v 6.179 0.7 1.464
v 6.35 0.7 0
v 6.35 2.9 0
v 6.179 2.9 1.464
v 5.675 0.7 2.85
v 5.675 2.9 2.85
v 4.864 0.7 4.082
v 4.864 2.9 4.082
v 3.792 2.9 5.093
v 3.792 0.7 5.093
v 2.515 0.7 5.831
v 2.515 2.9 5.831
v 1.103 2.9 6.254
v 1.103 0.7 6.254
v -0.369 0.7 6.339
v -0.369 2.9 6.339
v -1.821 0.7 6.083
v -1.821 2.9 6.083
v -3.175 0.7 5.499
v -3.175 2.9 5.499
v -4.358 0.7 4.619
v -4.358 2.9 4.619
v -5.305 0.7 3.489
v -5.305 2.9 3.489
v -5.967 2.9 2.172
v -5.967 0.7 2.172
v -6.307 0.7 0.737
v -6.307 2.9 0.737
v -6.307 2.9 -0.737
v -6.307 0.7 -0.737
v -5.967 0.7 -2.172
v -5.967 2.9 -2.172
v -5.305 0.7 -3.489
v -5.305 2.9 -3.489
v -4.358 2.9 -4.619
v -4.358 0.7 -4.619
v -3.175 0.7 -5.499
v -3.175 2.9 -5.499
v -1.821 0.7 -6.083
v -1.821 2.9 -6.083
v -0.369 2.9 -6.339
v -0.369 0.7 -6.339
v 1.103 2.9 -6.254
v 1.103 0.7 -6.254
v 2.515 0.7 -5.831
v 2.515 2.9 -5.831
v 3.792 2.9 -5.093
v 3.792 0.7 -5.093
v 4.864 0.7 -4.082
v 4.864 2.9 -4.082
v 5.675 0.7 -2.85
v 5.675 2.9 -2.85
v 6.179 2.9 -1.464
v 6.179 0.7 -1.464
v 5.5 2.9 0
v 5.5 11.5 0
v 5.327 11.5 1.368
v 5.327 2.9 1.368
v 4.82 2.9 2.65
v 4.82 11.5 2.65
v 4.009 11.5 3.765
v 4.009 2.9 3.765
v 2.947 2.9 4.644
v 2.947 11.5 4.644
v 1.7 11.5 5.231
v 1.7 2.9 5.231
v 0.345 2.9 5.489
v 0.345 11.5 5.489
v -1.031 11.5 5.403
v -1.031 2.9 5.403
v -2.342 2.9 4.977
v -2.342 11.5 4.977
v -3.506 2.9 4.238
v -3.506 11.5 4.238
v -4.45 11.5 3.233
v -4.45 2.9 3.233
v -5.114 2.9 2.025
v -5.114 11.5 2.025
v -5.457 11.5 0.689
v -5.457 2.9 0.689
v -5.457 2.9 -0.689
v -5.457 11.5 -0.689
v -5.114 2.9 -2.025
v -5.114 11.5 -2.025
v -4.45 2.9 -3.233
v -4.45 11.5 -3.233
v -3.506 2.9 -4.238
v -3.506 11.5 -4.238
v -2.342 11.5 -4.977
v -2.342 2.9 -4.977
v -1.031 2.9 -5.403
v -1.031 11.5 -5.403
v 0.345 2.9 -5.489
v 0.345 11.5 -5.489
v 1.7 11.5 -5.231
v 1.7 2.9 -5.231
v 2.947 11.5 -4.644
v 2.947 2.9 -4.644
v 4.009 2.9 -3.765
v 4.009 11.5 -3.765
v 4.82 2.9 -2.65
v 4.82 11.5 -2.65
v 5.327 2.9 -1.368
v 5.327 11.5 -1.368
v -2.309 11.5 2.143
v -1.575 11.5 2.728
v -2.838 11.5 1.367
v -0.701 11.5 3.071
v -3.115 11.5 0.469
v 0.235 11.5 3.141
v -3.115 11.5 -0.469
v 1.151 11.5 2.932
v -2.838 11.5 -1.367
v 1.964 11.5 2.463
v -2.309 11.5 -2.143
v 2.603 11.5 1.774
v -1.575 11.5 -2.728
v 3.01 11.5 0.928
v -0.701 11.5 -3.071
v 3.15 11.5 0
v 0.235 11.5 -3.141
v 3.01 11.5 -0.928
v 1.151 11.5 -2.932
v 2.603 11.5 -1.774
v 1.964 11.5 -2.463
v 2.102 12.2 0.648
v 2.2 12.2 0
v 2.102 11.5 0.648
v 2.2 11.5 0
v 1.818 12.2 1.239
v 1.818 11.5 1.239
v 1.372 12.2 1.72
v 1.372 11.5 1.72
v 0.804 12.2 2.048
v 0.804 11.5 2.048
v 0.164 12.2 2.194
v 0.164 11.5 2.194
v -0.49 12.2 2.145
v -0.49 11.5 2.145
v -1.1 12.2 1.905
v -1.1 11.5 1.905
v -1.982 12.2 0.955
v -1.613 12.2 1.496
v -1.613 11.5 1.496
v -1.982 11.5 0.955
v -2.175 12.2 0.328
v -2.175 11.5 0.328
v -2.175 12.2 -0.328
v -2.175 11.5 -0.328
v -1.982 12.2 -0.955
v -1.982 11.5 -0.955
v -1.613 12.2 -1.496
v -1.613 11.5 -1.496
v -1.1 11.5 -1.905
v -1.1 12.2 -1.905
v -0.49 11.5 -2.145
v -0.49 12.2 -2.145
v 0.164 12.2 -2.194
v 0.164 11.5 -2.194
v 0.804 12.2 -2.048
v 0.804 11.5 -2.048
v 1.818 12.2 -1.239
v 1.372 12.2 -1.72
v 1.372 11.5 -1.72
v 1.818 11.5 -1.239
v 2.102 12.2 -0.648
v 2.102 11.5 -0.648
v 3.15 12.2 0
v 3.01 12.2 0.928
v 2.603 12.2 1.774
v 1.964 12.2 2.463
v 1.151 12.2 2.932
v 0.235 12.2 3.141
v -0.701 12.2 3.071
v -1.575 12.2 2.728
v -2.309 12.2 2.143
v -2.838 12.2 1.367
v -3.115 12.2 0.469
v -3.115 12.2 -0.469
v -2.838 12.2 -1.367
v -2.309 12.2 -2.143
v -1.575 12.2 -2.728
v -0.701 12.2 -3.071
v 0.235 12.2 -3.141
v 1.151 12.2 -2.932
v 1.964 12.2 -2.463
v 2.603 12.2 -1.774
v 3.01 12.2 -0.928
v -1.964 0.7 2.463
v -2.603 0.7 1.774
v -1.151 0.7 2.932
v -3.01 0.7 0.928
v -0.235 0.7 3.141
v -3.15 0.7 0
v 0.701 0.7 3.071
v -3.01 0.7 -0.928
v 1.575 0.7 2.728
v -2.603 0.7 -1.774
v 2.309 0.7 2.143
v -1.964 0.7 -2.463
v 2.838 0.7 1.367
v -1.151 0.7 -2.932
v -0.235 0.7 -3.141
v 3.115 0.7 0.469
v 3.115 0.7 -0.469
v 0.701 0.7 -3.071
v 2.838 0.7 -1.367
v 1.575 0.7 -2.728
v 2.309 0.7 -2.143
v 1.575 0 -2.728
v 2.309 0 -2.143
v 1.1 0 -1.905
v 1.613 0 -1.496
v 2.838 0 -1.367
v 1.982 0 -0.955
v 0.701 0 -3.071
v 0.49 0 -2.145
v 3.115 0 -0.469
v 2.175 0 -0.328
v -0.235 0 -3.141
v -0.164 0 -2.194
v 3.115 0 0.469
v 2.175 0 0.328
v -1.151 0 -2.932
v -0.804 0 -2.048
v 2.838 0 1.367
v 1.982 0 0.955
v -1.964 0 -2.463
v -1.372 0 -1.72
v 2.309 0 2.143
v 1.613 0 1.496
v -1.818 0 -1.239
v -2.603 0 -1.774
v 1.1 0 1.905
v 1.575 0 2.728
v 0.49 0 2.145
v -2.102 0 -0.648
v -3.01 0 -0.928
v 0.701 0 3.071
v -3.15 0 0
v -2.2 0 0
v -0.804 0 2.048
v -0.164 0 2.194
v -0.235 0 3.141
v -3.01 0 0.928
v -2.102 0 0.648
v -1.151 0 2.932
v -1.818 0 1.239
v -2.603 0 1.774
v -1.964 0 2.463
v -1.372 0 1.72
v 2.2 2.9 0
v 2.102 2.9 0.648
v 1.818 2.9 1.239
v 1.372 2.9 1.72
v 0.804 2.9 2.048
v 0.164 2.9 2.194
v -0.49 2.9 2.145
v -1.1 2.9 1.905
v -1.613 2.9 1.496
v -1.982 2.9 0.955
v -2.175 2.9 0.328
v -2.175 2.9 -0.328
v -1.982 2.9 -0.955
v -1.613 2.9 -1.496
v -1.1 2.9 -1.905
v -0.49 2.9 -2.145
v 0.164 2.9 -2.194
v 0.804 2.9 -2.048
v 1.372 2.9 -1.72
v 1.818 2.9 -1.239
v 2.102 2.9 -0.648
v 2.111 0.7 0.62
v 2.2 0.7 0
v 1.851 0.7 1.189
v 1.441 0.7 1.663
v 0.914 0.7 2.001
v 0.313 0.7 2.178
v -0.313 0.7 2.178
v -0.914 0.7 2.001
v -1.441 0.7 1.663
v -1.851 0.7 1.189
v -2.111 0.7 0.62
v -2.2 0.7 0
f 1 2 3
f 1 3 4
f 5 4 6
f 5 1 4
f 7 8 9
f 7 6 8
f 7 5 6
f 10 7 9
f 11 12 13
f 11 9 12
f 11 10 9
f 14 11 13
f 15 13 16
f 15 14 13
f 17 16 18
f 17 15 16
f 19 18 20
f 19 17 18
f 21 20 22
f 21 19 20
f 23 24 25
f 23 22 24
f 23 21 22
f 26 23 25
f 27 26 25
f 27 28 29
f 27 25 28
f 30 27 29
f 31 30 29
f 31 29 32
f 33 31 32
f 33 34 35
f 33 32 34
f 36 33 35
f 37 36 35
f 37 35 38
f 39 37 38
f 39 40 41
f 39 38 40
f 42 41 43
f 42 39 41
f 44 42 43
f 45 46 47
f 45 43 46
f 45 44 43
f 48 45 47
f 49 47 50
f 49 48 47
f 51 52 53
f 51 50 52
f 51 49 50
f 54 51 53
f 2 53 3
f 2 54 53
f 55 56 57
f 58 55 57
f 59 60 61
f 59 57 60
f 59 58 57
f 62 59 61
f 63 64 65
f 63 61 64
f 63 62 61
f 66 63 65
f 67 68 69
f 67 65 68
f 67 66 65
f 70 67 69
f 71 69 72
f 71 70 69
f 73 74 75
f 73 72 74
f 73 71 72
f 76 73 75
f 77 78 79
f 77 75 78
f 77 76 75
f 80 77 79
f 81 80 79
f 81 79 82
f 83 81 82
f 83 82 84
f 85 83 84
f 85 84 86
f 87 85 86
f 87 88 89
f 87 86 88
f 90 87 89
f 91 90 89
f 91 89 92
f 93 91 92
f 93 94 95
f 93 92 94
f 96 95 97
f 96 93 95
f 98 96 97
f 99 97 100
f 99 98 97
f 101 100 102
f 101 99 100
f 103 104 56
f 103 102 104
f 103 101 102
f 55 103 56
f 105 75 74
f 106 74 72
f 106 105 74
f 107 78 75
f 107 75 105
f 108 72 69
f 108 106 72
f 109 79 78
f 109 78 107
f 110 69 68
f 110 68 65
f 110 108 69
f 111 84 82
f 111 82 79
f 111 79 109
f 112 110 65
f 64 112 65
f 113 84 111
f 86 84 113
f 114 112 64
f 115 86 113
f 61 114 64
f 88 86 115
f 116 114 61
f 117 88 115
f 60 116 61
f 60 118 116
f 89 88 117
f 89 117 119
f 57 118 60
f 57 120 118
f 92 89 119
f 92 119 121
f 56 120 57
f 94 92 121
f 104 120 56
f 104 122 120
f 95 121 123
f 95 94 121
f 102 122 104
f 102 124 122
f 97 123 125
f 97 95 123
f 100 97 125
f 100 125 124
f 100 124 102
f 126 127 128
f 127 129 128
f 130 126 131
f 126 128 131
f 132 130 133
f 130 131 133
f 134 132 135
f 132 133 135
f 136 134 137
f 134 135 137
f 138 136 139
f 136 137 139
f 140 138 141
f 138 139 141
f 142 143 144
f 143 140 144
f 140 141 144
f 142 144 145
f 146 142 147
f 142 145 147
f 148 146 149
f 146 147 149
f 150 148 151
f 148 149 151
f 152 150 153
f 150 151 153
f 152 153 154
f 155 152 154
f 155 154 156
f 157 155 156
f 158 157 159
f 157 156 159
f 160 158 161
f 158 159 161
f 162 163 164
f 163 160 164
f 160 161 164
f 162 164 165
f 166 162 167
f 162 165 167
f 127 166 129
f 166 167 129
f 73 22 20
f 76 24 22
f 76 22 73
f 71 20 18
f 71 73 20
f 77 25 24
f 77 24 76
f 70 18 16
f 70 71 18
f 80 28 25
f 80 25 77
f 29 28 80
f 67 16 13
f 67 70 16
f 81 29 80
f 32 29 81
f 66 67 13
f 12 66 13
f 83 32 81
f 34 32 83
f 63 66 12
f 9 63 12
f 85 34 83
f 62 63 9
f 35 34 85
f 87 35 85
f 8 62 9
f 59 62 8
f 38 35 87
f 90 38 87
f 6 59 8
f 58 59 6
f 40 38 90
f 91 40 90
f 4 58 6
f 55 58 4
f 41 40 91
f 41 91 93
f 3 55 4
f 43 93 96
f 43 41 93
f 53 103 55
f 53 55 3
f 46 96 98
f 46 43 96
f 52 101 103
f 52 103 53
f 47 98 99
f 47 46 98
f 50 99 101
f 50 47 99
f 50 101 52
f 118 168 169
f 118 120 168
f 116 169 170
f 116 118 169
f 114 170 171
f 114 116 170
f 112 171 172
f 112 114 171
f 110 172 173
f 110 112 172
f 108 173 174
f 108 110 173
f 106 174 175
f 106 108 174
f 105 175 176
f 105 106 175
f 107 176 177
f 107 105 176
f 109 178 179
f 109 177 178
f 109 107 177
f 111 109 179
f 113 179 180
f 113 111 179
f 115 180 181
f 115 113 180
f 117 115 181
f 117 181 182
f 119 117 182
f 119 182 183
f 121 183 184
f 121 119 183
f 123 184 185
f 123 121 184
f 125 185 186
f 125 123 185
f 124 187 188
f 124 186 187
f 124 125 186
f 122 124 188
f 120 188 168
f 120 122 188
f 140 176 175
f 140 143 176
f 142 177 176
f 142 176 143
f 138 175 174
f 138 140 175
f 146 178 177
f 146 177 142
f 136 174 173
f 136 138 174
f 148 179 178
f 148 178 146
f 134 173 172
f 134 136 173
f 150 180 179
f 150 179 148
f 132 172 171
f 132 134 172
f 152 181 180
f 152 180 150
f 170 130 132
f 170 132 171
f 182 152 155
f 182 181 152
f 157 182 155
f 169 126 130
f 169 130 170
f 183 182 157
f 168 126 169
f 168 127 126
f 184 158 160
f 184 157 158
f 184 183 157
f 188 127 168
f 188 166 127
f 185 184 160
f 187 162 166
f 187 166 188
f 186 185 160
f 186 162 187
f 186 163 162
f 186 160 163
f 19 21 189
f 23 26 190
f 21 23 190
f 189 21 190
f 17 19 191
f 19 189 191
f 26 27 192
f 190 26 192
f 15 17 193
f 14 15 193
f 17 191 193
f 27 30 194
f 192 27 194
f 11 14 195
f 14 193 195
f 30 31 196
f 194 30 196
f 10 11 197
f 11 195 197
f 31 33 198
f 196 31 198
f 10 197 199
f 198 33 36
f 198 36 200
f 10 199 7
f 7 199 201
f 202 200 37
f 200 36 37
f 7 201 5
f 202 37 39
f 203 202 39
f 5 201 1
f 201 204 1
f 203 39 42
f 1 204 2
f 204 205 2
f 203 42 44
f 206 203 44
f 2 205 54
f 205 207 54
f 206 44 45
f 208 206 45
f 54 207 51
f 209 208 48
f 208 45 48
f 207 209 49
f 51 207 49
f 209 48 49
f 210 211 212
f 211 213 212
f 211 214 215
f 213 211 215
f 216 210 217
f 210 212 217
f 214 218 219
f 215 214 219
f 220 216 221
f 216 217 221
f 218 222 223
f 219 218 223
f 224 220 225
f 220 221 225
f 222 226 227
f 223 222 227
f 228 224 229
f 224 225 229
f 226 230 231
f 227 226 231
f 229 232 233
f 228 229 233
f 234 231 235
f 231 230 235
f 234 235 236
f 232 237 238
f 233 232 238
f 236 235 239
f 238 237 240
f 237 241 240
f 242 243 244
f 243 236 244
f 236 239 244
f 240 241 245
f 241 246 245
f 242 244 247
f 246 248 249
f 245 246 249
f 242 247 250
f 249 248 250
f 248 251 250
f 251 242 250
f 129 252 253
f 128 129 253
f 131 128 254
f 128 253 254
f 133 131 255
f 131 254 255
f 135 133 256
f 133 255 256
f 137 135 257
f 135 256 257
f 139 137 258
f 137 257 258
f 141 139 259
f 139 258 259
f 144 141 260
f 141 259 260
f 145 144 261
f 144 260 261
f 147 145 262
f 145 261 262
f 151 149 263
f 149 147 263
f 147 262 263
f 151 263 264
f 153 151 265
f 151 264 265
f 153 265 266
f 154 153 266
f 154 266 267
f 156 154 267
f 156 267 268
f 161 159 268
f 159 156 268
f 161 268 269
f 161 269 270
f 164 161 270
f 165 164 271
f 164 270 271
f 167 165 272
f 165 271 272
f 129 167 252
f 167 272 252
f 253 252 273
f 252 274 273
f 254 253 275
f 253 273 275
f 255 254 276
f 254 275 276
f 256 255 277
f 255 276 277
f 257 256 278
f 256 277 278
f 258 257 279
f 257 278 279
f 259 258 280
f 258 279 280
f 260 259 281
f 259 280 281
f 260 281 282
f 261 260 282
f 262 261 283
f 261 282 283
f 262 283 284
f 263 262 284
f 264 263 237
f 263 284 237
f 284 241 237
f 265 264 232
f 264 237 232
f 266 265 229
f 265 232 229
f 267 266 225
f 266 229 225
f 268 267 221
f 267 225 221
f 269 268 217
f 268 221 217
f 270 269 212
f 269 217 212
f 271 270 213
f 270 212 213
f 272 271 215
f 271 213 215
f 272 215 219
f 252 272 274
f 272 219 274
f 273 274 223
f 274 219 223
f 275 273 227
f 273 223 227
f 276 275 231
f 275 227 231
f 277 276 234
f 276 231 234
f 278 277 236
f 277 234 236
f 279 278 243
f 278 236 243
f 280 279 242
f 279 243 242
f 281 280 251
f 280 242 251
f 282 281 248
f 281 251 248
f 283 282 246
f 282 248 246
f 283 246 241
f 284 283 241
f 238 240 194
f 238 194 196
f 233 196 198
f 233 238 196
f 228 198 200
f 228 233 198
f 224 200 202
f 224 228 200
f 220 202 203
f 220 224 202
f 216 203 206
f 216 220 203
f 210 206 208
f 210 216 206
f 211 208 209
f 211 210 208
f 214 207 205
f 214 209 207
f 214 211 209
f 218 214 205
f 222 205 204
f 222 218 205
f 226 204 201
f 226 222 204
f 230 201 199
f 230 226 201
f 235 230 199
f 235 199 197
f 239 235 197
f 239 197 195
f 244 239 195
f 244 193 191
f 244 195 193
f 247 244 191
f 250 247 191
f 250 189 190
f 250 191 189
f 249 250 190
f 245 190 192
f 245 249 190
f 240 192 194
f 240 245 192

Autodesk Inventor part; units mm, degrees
ref_plane "YZ Plane" through (0, 0, 0) normal (1, 0, 0) x (0, 1, 0)
ref_plane "XZ Plane" through (0, 0, 0) normal (0, 1, 0) x (-1, 0, 0)
ref_plane "XY Plane" through (0, 0, 0) normal (0, 0, 1) x (1, 0, 0)
sketch "Sketch1" plane through (0, 0, 0) normal (0, 1, 0) x (-1, 0, 0)
  circle A0 centre (0, 0) radius 3.15
  circle A1 centre (0, 0) radius 2.2
  dimension "d0" = 6.3
  dimension "d1" = 4.4
extrude "Extrusion1" add sketch "Sketch1" along normal blind 0.7
sketch "Sketch2" plane through (0, 0.7, 0) normal (0, 1, 0) x (1, 0, 0)
  circle A0 centre (0, 0) radius 2.2 projected
  circle A1 centre (0, 0) radius 3.15 projected
  circle A2 centre (0, 0) radius 6.35
  dimension "d4" = 12.7
extrude "Extrusion2" add sketch "Sketch2" along normal blind 2.2 contours A1 | A2
sketch "Sketch3" plane through (0, 2.9, 0) normal (0, 1, 0) x (1, 0, 0)
  circle A0 centre (0, 0) radius 2.2 projected
  circle A1 centre (0, 0) radius 6.35 projected
  circle A2 centre (0, 0) radius 5.5
  dimension "d7" = 11
extrude "Extrusion3" add sketch "Sketch3" along normal blind 8.6 contours A2
sketch "Sketch4" plane through (0, 11.5, 0) normal (0, 1, 0) x (1, 0, 0)
  circle A0 centre (0, 0) radius 2.2 projected
  circle A1 centre (0, 0) radius 3.15 projected
extrude "Extrusion4" add sketch "Sketch4" along normal blind 0.7
properties part number "lager" material "Stainless Steel"
